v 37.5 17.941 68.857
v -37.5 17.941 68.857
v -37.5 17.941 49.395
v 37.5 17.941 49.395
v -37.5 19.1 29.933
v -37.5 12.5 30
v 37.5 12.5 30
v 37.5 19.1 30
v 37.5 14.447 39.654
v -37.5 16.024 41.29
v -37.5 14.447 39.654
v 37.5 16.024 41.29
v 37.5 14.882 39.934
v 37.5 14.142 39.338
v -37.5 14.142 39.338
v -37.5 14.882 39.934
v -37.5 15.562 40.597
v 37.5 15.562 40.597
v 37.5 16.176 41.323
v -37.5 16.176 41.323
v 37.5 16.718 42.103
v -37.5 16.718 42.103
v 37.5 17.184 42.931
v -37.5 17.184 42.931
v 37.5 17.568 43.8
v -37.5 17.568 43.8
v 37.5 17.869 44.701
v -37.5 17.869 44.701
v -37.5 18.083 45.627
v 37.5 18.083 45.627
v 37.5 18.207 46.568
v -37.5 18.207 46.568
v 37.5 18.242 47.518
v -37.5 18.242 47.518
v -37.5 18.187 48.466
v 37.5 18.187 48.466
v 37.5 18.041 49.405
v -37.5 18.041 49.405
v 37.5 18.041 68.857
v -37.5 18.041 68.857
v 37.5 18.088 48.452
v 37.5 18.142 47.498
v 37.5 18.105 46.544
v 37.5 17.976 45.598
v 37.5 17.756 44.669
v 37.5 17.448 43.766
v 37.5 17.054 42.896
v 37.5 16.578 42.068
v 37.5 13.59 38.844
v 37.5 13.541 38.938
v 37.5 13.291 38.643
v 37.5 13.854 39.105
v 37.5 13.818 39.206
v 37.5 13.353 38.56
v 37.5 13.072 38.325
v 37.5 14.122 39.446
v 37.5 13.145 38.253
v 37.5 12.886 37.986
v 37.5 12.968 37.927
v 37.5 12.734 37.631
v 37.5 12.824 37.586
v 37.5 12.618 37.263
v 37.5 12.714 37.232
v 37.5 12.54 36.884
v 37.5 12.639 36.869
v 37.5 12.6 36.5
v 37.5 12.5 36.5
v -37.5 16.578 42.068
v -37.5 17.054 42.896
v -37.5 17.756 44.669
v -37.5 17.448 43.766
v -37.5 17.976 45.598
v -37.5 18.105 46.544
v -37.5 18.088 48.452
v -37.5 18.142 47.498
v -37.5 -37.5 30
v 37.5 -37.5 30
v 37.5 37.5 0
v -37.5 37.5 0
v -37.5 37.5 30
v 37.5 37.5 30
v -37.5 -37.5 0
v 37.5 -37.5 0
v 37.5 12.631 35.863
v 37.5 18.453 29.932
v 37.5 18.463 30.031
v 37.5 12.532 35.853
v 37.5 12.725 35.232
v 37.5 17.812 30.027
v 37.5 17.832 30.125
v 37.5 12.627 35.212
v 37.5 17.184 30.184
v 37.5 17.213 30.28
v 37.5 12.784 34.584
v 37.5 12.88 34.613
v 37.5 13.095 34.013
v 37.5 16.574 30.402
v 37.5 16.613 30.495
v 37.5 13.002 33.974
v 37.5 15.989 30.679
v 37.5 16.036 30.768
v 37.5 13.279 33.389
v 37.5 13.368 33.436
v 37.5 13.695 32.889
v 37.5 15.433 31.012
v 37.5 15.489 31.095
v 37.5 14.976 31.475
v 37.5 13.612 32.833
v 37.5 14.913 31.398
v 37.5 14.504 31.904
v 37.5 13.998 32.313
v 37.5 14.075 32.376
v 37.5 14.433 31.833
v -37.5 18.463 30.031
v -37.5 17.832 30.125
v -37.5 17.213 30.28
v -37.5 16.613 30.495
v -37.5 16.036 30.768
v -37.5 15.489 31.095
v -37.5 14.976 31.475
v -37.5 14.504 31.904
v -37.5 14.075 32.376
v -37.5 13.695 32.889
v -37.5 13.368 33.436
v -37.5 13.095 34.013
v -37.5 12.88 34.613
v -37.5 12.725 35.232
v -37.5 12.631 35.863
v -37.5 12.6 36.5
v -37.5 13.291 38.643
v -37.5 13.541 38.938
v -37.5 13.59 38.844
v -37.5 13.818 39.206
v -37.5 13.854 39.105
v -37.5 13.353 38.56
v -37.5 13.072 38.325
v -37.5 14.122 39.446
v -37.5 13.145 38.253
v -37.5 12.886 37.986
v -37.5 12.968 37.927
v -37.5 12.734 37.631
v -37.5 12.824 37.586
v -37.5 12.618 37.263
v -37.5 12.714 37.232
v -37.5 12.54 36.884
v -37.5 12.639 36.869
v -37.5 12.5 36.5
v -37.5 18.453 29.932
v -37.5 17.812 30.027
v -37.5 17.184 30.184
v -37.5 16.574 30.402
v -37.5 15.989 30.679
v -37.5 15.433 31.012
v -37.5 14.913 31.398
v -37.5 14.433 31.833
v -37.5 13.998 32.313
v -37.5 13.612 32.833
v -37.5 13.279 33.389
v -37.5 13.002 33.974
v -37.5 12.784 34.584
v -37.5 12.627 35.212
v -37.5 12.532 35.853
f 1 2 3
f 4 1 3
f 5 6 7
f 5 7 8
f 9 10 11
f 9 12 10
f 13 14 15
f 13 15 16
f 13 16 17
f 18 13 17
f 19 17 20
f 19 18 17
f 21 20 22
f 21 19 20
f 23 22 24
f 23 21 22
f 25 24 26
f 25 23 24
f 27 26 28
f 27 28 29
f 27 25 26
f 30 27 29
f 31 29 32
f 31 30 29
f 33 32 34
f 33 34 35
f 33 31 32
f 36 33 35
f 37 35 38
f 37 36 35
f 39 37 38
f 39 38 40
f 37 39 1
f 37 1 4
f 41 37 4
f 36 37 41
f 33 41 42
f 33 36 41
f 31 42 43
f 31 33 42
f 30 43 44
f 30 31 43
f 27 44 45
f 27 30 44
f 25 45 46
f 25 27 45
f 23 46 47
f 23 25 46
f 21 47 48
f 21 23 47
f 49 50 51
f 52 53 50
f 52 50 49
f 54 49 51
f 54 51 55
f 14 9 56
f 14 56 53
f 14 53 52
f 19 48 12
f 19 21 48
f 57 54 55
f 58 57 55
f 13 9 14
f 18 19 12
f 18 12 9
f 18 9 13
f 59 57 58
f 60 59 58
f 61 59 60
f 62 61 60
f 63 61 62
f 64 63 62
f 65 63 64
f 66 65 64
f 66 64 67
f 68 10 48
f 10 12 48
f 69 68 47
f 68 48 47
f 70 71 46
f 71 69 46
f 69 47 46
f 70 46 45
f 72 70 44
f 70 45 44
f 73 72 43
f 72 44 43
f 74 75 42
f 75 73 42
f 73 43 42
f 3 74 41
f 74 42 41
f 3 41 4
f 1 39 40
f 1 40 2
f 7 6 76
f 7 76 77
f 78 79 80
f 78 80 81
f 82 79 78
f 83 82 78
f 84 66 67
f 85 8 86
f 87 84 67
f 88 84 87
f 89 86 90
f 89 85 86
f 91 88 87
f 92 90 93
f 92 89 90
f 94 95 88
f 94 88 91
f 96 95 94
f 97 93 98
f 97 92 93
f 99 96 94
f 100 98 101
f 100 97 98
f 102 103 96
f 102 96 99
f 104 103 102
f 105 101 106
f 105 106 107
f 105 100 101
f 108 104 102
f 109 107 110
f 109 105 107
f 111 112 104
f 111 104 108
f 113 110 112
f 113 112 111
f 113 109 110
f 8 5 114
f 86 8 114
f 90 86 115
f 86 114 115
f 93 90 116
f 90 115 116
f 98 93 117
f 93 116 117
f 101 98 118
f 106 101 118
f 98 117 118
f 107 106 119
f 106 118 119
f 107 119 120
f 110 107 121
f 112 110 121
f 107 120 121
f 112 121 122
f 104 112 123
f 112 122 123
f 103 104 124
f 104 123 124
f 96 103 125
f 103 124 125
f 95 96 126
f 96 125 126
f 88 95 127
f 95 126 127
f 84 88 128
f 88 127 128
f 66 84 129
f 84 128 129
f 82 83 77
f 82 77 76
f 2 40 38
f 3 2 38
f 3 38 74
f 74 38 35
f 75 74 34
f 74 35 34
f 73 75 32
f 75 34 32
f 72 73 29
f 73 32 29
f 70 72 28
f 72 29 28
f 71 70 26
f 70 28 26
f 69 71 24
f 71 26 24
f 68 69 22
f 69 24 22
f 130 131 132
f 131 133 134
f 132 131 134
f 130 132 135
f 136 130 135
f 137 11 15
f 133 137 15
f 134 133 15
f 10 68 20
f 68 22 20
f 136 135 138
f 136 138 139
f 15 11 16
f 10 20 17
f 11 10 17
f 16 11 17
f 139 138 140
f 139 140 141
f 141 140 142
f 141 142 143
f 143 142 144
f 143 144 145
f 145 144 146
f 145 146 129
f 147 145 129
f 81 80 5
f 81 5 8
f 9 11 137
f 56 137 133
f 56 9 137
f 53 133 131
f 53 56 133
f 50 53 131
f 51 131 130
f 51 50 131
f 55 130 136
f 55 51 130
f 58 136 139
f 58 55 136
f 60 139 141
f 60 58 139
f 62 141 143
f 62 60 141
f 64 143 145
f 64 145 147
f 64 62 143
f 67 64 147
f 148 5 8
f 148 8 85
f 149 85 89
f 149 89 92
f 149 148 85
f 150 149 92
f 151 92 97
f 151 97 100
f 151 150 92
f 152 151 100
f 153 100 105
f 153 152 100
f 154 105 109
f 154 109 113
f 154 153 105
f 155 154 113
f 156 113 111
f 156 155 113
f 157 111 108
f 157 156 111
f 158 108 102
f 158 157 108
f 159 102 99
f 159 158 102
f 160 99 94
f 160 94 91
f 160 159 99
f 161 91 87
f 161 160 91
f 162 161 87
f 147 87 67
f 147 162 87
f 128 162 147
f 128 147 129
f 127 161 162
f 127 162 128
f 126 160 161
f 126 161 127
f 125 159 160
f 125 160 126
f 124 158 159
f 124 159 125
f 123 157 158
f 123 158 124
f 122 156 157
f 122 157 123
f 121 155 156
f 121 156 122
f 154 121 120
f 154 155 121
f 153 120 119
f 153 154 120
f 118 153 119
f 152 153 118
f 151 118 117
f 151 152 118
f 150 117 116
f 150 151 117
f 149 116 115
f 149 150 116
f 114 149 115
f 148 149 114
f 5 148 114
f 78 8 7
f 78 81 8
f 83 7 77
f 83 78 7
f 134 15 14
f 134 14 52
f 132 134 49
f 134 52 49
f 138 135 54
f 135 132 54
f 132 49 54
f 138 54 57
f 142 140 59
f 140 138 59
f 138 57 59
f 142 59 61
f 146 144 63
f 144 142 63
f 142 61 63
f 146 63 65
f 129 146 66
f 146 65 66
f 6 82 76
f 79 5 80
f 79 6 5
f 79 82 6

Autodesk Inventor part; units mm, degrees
ref_plane "YZ Plane" through (0, 0, 0) normal (1, 0, 0) x (0, 1, 0)
ref_plane "XZ Plane" through (0, 0, 0) normal (0, 1, 0) x (-1, 0, 0)
sketch "草图1" plane through (0, 0, 0) normal (0, 0, 1) x (1, 0, 0)
  line L0 (37.5, -37.5) -> (-37.5, -37.5)
  line L1 (-37.5, -37.5) -> (-37.5, 37.5)
  line L2 (-37.5, 37.5) -> (37.5, 37.5)
  line L3 (37.5, 37.5) -> (37.5, -37.5)
  line L4 (37.5, -37.5) -> (-37.5, 37.5) construction
  line L5 (-37.5, -37.5) -> (37.5, 37.5) construction
  point P0 (0, 0)
  dimension "d0" = 75
  dimension "d1" = 75
extrude "拉伸1" add sketch "草图1" along normal blind 30
sketch "草图2" plane through (-37.5, 37.5, 0) normal (0, 1, 0) x (1, 0, 0)
  point P0 (37.5, 0)
ref_plane "工作平面1" through (-37.5, 12.5, 0) normal (0, 1, 0) x (1, 0, 0)
sketch "草图3" plane through (-37.5, 12.5, 0) normal (0, 1, 0) x (1, 0, 0)
  line L0 (75, -30) -> (0, -30) projected
  line L1 (75, -30) -> (0, -30)
  line L2 (0, -30) -> (0, -80)
  line L3 (0, -80) -> (75, -80)
  line L4 (75, -80) -> (75, -30)
  line L5 (0, 0) -> (0, -30) projected
  point P0 (37.5, 0)
  dimension "d5" = 50
extrude "拉伸2" add sketch "草图3" along normal blind 0.1
fillet "圆角1" radius 6.5 1 edges at (0, 12.6, 30)
sketch "草图4" plane through (-37.5, -37.5, 0) normal (-1, 0, 0) x (0, 0, 1)
  arc A0 (30, 56.6) -> (36.5, 50.1) centre (36.5, 56.6) ccw projected
  circle A1 centre (36.5, 56.6) radius 6.6
  line L0 (80, 50) -> (30, 50) projected
  line L1 (30, 50) -> (29.9, 56.6)
  point P0 (0, 37.5)
  point P1 (29.90303, 56.400046)
  point P2 (36.5, 50)
extrude "拉伸3" cut sketch "草图4" against normal blind 112.5 contours A1 L0 L1
sketch "草图5" plane through (-37.5, 12.6, 0) normal (0, 1, 0) x (1, 0, 0)
  line L0 (0, -36.5) -> (75, -36.5) projected
  line L1 (0, -36.5) -> (0, -80) projected
  line L2 (0, -80) -> (75, -80) projected
  line L3 (75, -80) -> (75, -36.5) projected
  point P0 (37.5, 0)
extrude "拉伸4" cut sketch "草图5" against normal blind 10
sketch "草图6" plane through (37.5, -37.5, 0) normal (1, 0, 0) x (0, 0, -1)
  circle A0 centre (-36.290069, 53.867726) radius 3.77357
  circle A1 centre (-36.290069, 53.867726) radius 3.873419
  circle A2 centre (-47.408546, 45.749477) radius 9.893293
  circle A3 centre (-47.408546, 45.749477) radius 9.993293
  line L0 (-49.395081, 55.441273) -> (-68.85686, 55.441273)
  line L1 (-68.85686, 55.441273) -> (-68.85686, 55.541273)
  line L2 (-68.85686, 55.541273) -> (-49.395081, 55.541273)
  line L3 (-49.395081, 55.541273) -> (-49.395081, 55.441273)
  line L4 (-36.5, 50) -> (-36.5, 50.1)
  line L5 (-39.337702, 51.642471) -> (-41.290421, 53.524165)
  point P0 (0, 37.5)
  point P1 (-49.405198, 55.541273)
  point P2 (-39.653725, 51.947)
  dimension "d13" = 0.1
sketch "草图6 outline for 拉伸5" plane through (37.5, -37.5, 0) normal (1, 0, 0) x (0, 0, -1)
  line L0 (-36.5, 50) -> (-36.5, 50.1)
  arc A0 (-39.653725, 51.947) -> (-36.5, 50) centre (-36.290069, 53.867726) ccw
  line L1 (-41.290421, 53.524165) -> (-39.653725, 51.947)
  arc A1 (-49.395081, 55.441273) -> (-41.290421, 53.524165) centre (-47.408546, 45.749477) cw
  line L2 (-68.85686, 55.441273) -> (-49.395081, 55.441273)
  line L3 (-68.85686, 55.541273) -> (-68.85686, 55.441273)
  line L4 (-49.405198, 55.541273) -> (-68.85686, 55.541273)
  arc A2 (-39.337702, 51.642471) -> (-49.405198, 55.541273) centre (-47.408546, 45.749477) ccw
  arc A3 (-36.5, 50.1) -> (-39.337702, 51.642471) centre (-36.290069, 53.867726) cw
extrude "拉伸5" add sketch "草图6 outline for 拉伸5" against normal up to surface (75 mm away)
properties part number "便签"
